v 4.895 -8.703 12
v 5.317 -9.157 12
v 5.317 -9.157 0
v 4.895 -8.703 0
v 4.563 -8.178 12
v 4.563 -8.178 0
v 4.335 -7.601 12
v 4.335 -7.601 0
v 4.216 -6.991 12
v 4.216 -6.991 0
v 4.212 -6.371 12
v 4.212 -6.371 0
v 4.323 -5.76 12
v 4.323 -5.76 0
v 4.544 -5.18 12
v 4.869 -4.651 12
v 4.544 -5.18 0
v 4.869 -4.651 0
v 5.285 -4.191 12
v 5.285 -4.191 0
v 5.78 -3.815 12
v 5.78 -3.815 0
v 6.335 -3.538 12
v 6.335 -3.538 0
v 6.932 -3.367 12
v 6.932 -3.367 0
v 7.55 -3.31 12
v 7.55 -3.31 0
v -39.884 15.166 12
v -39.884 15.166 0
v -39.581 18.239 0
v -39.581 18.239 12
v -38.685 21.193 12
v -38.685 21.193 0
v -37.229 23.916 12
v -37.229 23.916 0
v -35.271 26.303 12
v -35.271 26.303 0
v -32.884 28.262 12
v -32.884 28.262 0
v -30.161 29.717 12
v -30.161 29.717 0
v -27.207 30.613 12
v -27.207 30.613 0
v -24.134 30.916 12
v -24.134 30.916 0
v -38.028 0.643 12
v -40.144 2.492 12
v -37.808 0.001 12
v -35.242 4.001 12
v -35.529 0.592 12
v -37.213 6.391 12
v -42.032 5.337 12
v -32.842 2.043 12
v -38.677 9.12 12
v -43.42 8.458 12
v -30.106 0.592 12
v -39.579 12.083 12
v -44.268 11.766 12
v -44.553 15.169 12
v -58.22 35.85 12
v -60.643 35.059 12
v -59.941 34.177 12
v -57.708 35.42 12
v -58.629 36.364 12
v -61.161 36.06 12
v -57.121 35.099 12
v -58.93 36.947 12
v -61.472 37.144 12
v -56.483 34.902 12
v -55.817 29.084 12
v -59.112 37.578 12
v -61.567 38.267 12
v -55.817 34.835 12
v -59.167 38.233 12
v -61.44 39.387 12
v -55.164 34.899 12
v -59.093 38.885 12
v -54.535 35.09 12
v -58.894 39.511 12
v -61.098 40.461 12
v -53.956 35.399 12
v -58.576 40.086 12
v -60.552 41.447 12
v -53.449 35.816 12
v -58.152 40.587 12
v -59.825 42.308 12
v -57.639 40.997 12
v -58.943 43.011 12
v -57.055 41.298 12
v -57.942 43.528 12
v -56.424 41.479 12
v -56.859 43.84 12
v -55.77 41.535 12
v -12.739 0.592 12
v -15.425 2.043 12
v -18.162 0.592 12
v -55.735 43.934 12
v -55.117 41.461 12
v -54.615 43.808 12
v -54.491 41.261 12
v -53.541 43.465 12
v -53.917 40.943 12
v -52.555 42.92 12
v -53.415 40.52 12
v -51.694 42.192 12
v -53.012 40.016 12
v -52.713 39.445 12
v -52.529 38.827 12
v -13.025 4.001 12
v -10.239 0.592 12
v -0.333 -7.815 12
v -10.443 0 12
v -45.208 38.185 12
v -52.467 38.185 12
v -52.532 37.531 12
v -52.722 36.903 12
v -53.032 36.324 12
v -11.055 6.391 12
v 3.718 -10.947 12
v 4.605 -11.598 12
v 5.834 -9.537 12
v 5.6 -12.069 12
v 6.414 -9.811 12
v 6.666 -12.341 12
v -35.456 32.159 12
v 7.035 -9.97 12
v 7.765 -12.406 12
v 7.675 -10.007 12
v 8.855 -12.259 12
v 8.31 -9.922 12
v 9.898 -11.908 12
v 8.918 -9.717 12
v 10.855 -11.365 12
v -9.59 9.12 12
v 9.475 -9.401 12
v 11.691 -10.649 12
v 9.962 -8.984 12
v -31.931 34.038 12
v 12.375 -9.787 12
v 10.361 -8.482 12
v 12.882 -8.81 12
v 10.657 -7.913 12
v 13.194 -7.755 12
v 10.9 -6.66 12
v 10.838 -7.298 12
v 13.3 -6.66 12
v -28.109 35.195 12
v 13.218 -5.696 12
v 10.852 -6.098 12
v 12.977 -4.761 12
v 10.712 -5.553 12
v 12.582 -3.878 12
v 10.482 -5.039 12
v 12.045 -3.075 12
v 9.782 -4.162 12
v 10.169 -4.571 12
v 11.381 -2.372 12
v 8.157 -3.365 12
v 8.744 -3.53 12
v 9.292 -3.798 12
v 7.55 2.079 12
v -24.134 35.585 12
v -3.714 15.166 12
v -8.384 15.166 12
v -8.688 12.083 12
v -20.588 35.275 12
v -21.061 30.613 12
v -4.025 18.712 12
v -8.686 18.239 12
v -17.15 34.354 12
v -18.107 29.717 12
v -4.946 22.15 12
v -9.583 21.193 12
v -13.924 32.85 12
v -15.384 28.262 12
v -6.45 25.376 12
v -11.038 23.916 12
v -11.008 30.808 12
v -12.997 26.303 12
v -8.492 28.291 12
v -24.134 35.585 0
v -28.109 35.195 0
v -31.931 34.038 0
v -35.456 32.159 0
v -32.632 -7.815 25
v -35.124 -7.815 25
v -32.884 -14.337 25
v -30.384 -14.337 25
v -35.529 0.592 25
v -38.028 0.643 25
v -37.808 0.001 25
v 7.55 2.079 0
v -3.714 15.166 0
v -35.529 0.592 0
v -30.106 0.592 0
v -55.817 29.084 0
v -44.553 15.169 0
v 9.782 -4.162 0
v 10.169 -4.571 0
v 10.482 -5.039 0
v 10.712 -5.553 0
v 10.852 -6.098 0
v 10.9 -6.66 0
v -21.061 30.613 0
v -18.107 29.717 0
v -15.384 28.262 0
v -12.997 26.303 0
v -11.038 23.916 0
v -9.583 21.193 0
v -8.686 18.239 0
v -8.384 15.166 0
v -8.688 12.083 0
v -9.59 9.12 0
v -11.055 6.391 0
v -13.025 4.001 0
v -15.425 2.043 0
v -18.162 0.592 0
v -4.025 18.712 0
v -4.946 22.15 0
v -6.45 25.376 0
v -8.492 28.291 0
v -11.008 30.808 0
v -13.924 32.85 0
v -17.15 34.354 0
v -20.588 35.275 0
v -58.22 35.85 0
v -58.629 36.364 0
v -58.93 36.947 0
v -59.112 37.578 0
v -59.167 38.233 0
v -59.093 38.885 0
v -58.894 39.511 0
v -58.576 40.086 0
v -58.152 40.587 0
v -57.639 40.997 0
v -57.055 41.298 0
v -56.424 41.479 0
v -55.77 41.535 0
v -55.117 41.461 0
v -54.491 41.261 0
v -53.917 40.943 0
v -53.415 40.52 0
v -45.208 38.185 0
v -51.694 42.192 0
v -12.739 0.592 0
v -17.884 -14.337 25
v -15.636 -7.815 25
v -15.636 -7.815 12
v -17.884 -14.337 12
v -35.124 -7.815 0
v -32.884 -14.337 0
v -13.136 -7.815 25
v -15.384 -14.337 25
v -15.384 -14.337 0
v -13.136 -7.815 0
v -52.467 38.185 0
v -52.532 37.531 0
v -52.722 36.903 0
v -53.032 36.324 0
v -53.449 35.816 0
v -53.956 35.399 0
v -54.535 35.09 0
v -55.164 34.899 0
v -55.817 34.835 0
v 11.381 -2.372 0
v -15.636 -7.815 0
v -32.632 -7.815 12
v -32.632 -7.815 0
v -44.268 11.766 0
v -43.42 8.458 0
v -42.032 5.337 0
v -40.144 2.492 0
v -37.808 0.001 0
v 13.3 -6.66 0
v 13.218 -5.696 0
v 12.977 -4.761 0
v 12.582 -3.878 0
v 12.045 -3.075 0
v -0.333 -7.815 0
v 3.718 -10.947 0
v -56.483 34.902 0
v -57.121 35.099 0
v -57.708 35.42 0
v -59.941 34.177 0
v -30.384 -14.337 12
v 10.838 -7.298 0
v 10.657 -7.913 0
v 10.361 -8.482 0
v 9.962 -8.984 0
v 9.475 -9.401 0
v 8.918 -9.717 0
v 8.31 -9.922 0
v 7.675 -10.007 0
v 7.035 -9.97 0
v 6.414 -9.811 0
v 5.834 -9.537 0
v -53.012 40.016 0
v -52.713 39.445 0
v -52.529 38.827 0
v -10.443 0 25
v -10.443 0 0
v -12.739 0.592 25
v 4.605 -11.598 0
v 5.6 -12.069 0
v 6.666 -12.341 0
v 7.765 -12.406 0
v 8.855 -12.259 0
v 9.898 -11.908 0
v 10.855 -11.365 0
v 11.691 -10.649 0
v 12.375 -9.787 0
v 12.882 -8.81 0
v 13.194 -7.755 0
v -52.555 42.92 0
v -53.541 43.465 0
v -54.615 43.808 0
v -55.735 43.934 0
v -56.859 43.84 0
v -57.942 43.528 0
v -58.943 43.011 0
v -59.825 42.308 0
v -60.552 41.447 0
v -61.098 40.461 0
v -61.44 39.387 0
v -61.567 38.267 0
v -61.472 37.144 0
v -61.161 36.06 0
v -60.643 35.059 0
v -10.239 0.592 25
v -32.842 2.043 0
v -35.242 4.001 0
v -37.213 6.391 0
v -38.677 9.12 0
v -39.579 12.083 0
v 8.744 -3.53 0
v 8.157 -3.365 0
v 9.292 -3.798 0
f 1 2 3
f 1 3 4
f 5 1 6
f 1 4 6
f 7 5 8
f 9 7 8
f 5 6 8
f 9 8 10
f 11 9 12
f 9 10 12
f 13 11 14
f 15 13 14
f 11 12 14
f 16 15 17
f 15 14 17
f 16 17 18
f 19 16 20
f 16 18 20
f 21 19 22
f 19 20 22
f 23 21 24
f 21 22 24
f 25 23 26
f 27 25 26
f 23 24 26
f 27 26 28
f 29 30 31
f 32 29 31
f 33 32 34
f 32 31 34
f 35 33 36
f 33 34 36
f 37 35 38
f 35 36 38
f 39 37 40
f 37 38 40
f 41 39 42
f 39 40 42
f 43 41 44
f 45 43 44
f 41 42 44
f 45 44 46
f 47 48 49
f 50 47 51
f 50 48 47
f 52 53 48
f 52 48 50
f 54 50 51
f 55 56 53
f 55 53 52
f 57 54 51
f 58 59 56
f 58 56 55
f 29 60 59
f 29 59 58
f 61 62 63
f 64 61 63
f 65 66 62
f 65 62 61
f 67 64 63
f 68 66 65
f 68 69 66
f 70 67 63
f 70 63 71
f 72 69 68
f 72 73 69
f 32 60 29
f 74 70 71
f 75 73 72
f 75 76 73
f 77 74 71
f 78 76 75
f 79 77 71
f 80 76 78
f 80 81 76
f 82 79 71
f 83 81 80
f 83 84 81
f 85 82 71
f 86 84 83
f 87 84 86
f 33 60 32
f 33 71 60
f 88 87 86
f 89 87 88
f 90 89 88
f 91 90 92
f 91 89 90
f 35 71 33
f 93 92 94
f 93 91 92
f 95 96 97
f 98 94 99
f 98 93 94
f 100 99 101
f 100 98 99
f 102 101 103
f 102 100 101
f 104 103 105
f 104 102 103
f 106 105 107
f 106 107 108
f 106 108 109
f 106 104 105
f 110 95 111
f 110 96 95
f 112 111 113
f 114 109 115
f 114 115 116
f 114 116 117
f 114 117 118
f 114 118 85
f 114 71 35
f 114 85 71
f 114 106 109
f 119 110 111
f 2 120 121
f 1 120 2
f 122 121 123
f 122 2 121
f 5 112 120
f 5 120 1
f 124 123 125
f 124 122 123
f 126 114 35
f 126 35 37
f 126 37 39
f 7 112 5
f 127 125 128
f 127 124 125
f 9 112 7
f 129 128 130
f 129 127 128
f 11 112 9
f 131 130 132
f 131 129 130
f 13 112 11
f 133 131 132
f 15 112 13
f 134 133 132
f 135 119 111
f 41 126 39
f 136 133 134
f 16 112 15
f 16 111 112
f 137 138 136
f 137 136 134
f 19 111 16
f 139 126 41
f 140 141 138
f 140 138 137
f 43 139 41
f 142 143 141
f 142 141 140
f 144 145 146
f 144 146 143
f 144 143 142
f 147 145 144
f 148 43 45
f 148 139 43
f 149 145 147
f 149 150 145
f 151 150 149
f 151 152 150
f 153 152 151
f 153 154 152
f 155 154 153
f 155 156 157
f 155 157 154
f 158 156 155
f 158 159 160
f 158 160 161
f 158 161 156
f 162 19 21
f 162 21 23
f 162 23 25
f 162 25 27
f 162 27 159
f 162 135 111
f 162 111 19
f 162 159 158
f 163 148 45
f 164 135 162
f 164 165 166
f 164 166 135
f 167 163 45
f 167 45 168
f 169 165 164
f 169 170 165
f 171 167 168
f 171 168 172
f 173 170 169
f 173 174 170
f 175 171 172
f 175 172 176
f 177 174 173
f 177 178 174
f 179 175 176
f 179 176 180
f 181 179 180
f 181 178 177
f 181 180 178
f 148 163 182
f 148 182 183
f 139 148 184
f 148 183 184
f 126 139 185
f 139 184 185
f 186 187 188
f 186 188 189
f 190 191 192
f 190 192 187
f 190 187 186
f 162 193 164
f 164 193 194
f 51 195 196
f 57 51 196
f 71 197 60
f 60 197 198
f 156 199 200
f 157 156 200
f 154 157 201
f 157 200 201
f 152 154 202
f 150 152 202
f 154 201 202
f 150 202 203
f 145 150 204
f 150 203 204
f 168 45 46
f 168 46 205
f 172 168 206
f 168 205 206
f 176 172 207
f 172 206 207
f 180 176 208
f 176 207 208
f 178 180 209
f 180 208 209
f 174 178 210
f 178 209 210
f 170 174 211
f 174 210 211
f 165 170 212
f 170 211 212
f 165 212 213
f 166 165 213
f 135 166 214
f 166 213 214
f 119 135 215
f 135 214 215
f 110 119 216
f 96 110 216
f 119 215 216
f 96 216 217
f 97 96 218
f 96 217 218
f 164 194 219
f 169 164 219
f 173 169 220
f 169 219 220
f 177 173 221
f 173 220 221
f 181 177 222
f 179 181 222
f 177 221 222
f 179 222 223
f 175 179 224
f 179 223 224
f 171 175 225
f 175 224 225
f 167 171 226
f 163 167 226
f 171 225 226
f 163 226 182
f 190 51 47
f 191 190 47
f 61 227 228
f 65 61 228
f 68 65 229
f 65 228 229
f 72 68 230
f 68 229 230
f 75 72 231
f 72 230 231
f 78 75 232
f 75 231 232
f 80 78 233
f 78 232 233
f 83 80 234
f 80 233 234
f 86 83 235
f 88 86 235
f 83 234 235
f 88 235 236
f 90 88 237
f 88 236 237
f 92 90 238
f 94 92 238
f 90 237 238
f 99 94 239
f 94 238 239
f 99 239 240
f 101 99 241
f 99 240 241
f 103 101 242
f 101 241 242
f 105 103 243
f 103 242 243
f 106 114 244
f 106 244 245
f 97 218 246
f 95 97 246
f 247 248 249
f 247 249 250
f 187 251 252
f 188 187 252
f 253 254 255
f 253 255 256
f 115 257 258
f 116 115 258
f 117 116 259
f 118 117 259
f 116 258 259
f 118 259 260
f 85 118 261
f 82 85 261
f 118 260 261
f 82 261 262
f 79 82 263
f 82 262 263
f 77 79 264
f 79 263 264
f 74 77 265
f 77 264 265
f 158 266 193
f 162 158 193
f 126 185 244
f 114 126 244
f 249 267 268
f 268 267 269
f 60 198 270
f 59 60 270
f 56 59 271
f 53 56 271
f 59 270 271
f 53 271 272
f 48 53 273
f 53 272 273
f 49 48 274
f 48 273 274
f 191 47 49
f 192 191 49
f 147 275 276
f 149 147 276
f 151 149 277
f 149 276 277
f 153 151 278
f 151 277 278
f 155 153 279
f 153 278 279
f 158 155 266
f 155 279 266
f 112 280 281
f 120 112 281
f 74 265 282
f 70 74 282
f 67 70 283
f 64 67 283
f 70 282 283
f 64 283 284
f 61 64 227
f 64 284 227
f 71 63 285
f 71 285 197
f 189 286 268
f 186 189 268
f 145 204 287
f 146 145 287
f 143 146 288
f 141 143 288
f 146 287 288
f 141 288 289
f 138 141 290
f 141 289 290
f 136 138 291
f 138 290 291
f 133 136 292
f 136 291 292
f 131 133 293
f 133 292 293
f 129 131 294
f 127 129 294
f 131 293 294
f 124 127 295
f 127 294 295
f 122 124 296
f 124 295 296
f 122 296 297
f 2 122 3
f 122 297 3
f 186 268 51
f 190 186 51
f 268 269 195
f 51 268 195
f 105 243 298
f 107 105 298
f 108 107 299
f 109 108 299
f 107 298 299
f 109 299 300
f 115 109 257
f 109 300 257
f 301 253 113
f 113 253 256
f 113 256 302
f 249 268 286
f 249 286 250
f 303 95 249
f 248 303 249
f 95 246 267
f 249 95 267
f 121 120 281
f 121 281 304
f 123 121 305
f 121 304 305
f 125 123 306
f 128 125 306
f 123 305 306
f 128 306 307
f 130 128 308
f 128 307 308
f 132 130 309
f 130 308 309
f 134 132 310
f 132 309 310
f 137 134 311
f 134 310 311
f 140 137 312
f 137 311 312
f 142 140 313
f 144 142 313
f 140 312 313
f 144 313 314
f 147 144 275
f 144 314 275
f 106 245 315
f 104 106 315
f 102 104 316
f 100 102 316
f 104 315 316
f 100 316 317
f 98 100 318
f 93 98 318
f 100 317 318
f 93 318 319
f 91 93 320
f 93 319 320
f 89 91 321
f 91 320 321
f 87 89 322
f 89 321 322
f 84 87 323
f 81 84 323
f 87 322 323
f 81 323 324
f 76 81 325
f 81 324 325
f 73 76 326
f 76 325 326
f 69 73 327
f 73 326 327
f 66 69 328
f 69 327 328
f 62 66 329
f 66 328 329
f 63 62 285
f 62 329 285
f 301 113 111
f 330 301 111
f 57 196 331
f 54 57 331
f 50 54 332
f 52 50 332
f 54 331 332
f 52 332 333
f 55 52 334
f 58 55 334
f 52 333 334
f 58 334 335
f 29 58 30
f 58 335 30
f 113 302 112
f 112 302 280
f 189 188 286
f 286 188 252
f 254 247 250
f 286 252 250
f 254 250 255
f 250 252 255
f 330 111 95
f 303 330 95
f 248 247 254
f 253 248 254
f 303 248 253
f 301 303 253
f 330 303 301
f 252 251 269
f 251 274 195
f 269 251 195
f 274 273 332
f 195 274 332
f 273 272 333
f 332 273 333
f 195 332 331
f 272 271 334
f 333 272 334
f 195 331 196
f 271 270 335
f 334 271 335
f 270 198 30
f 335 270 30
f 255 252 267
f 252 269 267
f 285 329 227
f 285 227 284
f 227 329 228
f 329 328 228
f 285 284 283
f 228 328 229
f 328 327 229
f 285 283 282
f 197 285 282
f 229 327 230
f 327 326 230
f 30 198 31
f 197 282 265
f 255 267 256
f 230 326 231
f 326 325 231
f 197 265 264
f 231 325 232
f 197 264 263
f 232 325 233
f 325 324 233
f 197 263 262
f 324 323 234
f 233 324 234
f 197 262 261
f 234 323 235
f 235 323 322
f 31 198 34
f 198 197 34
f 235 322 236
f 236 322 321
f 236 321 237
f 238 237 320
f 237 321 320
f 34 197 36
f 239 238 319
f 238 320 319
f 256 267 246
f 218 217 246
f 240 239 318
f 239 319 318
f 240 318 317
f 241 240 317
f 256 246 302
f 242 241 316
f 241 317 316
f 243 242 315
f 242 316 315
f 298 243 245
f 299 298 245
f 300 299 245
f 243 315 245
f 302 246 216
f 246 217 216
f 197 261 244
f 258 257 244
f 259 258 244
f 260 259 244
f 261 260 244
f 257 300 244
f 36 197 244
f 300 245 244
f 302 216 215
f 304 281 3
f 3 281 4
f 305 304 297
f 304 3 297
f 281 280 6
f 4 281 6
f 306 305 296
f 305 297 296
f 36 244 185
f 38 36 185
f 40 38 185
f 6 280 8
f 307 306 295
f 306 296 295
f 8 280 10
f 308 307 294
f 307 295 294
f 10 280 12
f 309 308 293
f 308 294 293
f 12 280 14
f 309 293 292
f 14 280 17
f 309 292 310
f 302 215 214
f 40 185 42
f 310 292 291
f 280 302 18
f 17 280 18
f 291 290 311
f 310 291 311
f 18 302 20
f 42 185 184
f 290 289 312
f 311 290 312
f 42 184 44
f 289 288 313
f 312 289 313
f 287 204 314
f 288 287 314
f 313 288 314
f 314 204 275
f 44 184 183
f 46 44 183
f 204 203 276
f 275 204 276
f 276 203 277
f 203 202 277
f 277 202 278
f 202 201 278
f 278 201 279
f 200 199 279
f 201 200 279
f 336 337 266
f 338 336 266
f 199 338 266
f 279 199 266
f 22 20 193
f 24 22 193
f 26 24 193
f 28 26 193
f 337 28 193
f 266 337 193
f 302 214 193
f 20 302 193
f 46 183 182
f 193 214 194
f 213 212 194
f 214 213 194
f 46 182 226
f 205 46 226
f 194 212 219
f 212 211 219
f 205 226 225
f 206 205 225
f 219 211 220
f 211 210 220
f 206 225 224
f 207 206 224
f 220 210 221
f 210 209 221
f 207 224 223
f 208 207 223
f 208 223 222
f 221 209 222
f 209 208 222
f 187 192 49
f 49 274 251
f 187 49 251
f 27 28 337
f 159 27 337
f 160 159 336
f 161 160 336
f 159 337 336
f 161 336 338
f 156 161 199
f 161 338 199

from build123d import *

# Parameters (mm, degrees)
F1_DEPTH = 12
F2_DEPTH = 25
F3_DEPTH = 12


# Not quite as in the source:
# - ends of sketch curves that miss each other by under 0.0002 mm in the source are joined


with BuildPart() as f1:
    # F0 (on Top) → F1 (new body)
    with BuildSketch(Plane.XY):
        with BuildLine():
            ThreePointArc((-53.4150354708, 40.5196217052), (-52.7133447942, 39.4447339634), (-52.4674114416, 38.1848648238))
            Line((-52.4674114416, 38.1848648238), (-50.0674114416, 38.1848649627))
            ThreePointArc((-50.0674114416, 38.1848649627), (-50.4895358529, 40.3473267799), (-51.6939302977, 42.1922833515))
            Line((-51.6939302977, 42.1922833515), (-53.4150354708, 40.5196217052))
        make_face()
        with BuildLine():
            Line((-50.0674114416, 38.1848649627), (-52.4674114416, 38.1848649047))
            ThreePointArc((-52.4674114416, 38.1848649047), (-53.4486037246, 35.8160571069), (-55.8174114415, 34.8348648238))
            Line((-55.8174114415, 34.8348648238), (-55.8174114415, 32.4348648238))
            ThreePointArc((-55.8174114415, 32.4348648238), (-51.7515474497, 34.119000832), (-50.0674114416, 38.1848649627))
        make_face()
        with BuildLine():
            ThreePointArc((-51.6939302977, 42.1922833515), (-50.4895358529, 40.3473267799), (-50.0674114416, 38.1848648238))
            Line((-50.0674114416, 38.1848648238), (-45.2079510631, 38.1848650801))
            Line((-45.2079510631, 38.1848650801), (-51.6939302977, 42.1922833515))
        make_face()
        with BuildLine():
            Line((-45.2079510631, 38.1848650801), (-50.0674114416, 38.1848649627))
            ThreePointArc((-50.0674114416, 38.1848649627), (-51.7515474497, 34.119000832), (-55.8174114415, 32.4348648238))
            Line((-55.8174114415, 32.4348648238), (-55.8174114414, 29.083605512))
            Line((-55.8174114414, 29.083605512), (-44.5532578407, 15.1687110318))
            ThreePointArc((-44.5532578407, 15.1687110318), (-42.1350647352, 24.8048651036), (-35.4555304308, 32.1592477879))
            Line((-35.4555304308, 32.1592477879), (-45.2079510631, 38.1848650801))
        make_face()
        with BuildLine():
            Line((-55.8174114415, 32.4348648238), (-55.8174114415, 34.8348648238))
            ThreePointArc((-55.8174114415, 34.8348648238), (-57.1214560051, 35.0990962362), (-58.2197874124, 35.8501079425))
            Line((-58.2197874124, 35.8501079425), (-59.9408925855, 34.1774462962))
            ThreePointArc((-59.9408925855, 34.1774462962), (-58.0556968865, 32.8883963526), (-55.8174114415, 32.4348648238))
        make_face()
        with BuildLine():
            ThreePointArc((-58.2197874124, 35.8501079425), (-58.1521683229, 40.5872407946), (-53.4150354708, 40.5196217052))
            Line((-53.4150354708, 40.5196217052), (-51.6939302977, 42.1922833515))
            ThreePointArc((-51.6939302977, 42.1922833515), (-59.8248299692, 42.3083459677), (-59.9408925855, 34.1774462962))
            Line((-59.9408925855, 34.1774462962), (-58.2197874124, 35.8501079425))
        make_face()
        with BuildLine():
            Line((-55.8174114414, 29.083605512), (-55.8174114415, 32.4348648238))
            ThreePointArc((-55.8174114415, 32.4348648238), (-58.0556968865, 32.8883963526), (-59.9408925855, 34.1774462962))
            Line((-59.9408925855, 34.1774462962), (-55.8174114414, 29.083605512))
        make_face()
        with BuildLine():
            ThreePointArc((-24.1338443596, 35.5853722206), (-30.0482104313, 34.7100811604), (-35.4555304308, 32.1592477879))
            ThreePointArc((-35.4555304308, 32.1592477879), (-42.1350647352, 24.8048651036), (-44.5532578407, 15.1687110318))
            Line((-44.5532578407, 15.1687110318), (-42.6338443592, 15.1659585535))
            Line((-42.6338443592, 15.1659585535), (-39.8838443592, 15.1659585535))
            ThreePointArc((-39.8838443592, 15.1659585535), (-35.270776163, 26.3028903571), (-24.1338443595, 30.9159585535))
            Line((-24.1338443595, 30.9159585535), (-24.1338443596, 35.5853722206))
        make_face()
        with BuildLine():
            ThreePointArc((-3.7144306922, 15.1659585535), (-9.6951384875, 29.6046644255), (-24.1338443596, 35.5853722206))
            Line((-24.1338443596, 35.5853722206), (-24.1338443595, 30.9159585535))
            ThreePointArc((-24.1338443595, 30.9159585535), (-12.9969125556, 26.3028903573), (-8.3838443592, 15.1659585535))
            Line((-8.3838443592, 15.1659585535), (-5.6338443592, 15.1659585535))
            Line((-5.6338443592, 15.1659585535), (-3.7144306922, 15.1659585535))
        make_face()
        with BuildLine():
            Line((-42.6338443592, 15.1659585535), (-44.5532578407, 15.1687110318))
            ThreePointArc((-44.5532578407, 15.1687110318), (-42.7914410163, 6.8685769492), (-37.807970261, 0.0011725238))
            Line((-37.807970261, 0.0011725238), (-38.0284454354, 0.643162408))
            Line((-38.0284454354, 0.643162408), (-35.5289696075, 0.5919707473))
            Line((-35.5289696075, 0.5919707473), (-42.6338443592, 15.1659585535))
        make_face()
        with BuildLine():
            Line((7.5497227229, 2.079326472), (-3.7144306922, 15.1659585535))
            Line((-3.7144306922, 15.1659585535), (-5.6338443592, 15.1659585535))
            Line((-5.6338443592, 15.1659585535), (-12.7387191109, 0.5919707473))
            Line((-12.7387191109, 0.5919707473), (-10.2387191109, 0.5919707473))
            Line((-10.2387191109, 0.5919707473), (-10.4427343672, 0))
            Line((-10.4427343672, 0), (-0.3331204375, -7.8151351762))
            Line((-0.3331204375, -7.8151351762), (1.9170354556, -7.8151351762))
            ThreePointArc((1.9170354556, -7.8151351762), (3.0939956275, -3.0251503303), (7.549722723, -0.909568585))
            Line((7.549722723, -0.909568585), (7.5497227229, 2.079326472))
        make_face()
        with BuildLine():
            Line((-39.8838443592, 15.1659585535), (-42.6338443592, 15.1659585535))
            Line((-42.6338443592, 15.1659585535), (-35.5289696075, 0.5919707473))
            Line((-35.5289696075, 0.5919707473), (-30.1055593076, 0.5919707473))
            ThreePointArc((-30.1055593076, 0.5919707473), (-37.2127780015, 6.3907665453), (-39.8838443592, 15.1659585535))
        make_face()
        Polygon((-38.0284454354, 0.643162408), (-37.807970261, 0.0011725238), (-35.1236572441, -7.8151351762), (-32.6315665225, -7.8151351762), (-35.5289696075, 0.5919707473), align=None)
        with BuildLine():
            Line((-5.6338443592, 15.1659585535), (-8.3838443592, 15.1659585535))
            ThreePointArc((-8.3838443592, 15.1659585535), (-11.054910717, 6.3907665453), (-18.1621294109, 0.5919707473))
            Line((-18.1621294109, 0.5919707473), (-12.7387191109, 0.5919707473))
            Line((-12.7387191109, 0.5919707473), (-5.6338443592, 15.1659585535))
        make_face()
        with BuildLine():
            Line((11.3813838275, -2.3722765282), (7.5497227229, 2.079326472))
            Line((7.5497227229, 2.079326472), (7.549722723, -0.909568585))
            ThreePointArc((7.549722723, -0.909568585), (9.6004019609, -1.2876774223), (11.3813838275, -2.3722765282))
        make_face()
        Polygon((-32.6315665225, -7.8151351762), (-35.1236572441, -7.8151351762), (-32.8838443592, -14.3371266833), (-30.3838443592, -14.3371266833), align=None)
        Polygon((-10.2387191109, 0.5919707473), (-12.7387191109, 0.5919707473), (-15.636122196, -7.8151351762), (-13.136122196, -7.8151351762), (-10.4427343672, 0), align=None)
        with BuildLine():
            ThreePointArc((11.3813838275, -2.3722765282), (9.6004019609, -1.2876774223), (7.549722723, -0.909568585))
            Line((7.549722723, -0.909568585), (7.549722723, -3.309568585))
            ThreePointArc((7.549722723, -3.309568585), (8.744466279, -3.5298580815), (9.7820818013, -4.1617549519))
            Line((9.7820818013, -4.1617549519), (11.3813838275, -2.3722765282))
        make_face()
        with BuildLine():
            Line((7.549722723, -3.309568585), (7.549722723, -0.909568585))
            ThreePointArc((7.549722723, -0.909568585), (3.0939956275, -3.0251503303), (1.9170354556, -7.8151351762))
            ThreePointArc((1.9170354556, -7.8151351762), (2.5652068364, -9.5261172721), (3.7180616186, -10.9468606418))
            Line((3.7180616186, -10.9468606418), (5.3173636448, -9.1573822181))
            ThreePointArc((5.3173636448, -9.1573822181), (4.4200122196, -5.464825029), (7.549722723, -3.309568585))
        make_face()
        with BuildLine():
            ThreePointArc((13.2997227231, -6.659568585), (12.7982725871, -4.3111171112), (11.3813838275, -2.3722765282))
            Line((11.3813838275, -2.3722765282), (9.7820818013, -4.1617549519))
            ThreePointArc((9.7820818013, -4.1617549519), (10.6075735134, -5.2913403351), (10.8997227231, -6.659568585))
            ThreePointArc((10.8997227231, -6.659568585), (8.917950973, -9.7174193754), (5.3173636448, -9.1573822181))
            Line((5.3173636448, -9.1573822181), (3.7180616186, -10.9468606418))
            ThreePointArc((3.7180616186, -10.9468606418), (9.8981741968, -11.908118449), (13.2997227231, -6.659568585))
        make_face()
        Polygon((-24.1338443592, -7.8151351762), (-32.6315665225, -7.8151351762), (-30.3838443592, -14.3371266833), (-24.1338443592, -14.3371266833), (-24.1338443592, -7.8529477167), align=None)
        Polygon((-13.136122196, -7.8151351762), (-15.636122196, -7.8151351762), (-17.8838443592, -14.3371266833), (-15.3838443592, -14.3371266833), align=None)
        Polygon((-17.8838443592, -14.3371266833), (-15.636122196, -7.8151351762), (-24.1338443592, -7.8151351762), (-24.1338443592, -7.8529477167), (-24.1338443592, -14.3371266833), align=None)
    extrude(amount=F1_DEPTH)

    # F0 (on Top) → F2 (join)
    with BuildSketch(Plane.XY):
        Polygon((-38.0284454354, 0.643162408), (-37.807970261, 0.0011725238), (-35.1236572441, -7.8151351762), (-32.6315665225, -7.8151351762), (-35.5289696075, 0.5919707473), align=None)
        Polygon((-32.6315665225, -7.8151351762), (-35.1236572441, -7.8151351762), (-32.8838443592, -14.3371266833), (-30.3838443592, -14.3371266833), align=None)
        Polygon((-13.136122196, -7.8151351762), (-15.636122196, -7.8151351762), (-17.8838443592, -14.3371266833), (-15.3838443592, -14.3371266833), align=None)
        Polygon((-10.2387191109, 0.5919707473), (-12.7387191109, 0.5919707473), (-15.636122196, -7.8151351762), (-13.136122196, -7.8151351762), (-10.4427343672, 0), align=None)
    extrude(amount=F2_DEPTH)

    # F0 (on Top) → F3 (join)
    with BuildSketch(Plane.XY):
        with BuildLine():
            ThreePointArc((3.7180616186, -10.9468606418), (2.5652068364, -9.5261172721), (1.9170354556, -7.8151351762))
            Line((1.9170354556, -7.8151351762), (-0.3331204375, -7.8151351762))
            Line((-0.3331204375, -7.8151351762), (3.7180616186, -10.9468606418))
        make_face()
    extrude(amount=F3_DEPTH)


solid = f1.part
